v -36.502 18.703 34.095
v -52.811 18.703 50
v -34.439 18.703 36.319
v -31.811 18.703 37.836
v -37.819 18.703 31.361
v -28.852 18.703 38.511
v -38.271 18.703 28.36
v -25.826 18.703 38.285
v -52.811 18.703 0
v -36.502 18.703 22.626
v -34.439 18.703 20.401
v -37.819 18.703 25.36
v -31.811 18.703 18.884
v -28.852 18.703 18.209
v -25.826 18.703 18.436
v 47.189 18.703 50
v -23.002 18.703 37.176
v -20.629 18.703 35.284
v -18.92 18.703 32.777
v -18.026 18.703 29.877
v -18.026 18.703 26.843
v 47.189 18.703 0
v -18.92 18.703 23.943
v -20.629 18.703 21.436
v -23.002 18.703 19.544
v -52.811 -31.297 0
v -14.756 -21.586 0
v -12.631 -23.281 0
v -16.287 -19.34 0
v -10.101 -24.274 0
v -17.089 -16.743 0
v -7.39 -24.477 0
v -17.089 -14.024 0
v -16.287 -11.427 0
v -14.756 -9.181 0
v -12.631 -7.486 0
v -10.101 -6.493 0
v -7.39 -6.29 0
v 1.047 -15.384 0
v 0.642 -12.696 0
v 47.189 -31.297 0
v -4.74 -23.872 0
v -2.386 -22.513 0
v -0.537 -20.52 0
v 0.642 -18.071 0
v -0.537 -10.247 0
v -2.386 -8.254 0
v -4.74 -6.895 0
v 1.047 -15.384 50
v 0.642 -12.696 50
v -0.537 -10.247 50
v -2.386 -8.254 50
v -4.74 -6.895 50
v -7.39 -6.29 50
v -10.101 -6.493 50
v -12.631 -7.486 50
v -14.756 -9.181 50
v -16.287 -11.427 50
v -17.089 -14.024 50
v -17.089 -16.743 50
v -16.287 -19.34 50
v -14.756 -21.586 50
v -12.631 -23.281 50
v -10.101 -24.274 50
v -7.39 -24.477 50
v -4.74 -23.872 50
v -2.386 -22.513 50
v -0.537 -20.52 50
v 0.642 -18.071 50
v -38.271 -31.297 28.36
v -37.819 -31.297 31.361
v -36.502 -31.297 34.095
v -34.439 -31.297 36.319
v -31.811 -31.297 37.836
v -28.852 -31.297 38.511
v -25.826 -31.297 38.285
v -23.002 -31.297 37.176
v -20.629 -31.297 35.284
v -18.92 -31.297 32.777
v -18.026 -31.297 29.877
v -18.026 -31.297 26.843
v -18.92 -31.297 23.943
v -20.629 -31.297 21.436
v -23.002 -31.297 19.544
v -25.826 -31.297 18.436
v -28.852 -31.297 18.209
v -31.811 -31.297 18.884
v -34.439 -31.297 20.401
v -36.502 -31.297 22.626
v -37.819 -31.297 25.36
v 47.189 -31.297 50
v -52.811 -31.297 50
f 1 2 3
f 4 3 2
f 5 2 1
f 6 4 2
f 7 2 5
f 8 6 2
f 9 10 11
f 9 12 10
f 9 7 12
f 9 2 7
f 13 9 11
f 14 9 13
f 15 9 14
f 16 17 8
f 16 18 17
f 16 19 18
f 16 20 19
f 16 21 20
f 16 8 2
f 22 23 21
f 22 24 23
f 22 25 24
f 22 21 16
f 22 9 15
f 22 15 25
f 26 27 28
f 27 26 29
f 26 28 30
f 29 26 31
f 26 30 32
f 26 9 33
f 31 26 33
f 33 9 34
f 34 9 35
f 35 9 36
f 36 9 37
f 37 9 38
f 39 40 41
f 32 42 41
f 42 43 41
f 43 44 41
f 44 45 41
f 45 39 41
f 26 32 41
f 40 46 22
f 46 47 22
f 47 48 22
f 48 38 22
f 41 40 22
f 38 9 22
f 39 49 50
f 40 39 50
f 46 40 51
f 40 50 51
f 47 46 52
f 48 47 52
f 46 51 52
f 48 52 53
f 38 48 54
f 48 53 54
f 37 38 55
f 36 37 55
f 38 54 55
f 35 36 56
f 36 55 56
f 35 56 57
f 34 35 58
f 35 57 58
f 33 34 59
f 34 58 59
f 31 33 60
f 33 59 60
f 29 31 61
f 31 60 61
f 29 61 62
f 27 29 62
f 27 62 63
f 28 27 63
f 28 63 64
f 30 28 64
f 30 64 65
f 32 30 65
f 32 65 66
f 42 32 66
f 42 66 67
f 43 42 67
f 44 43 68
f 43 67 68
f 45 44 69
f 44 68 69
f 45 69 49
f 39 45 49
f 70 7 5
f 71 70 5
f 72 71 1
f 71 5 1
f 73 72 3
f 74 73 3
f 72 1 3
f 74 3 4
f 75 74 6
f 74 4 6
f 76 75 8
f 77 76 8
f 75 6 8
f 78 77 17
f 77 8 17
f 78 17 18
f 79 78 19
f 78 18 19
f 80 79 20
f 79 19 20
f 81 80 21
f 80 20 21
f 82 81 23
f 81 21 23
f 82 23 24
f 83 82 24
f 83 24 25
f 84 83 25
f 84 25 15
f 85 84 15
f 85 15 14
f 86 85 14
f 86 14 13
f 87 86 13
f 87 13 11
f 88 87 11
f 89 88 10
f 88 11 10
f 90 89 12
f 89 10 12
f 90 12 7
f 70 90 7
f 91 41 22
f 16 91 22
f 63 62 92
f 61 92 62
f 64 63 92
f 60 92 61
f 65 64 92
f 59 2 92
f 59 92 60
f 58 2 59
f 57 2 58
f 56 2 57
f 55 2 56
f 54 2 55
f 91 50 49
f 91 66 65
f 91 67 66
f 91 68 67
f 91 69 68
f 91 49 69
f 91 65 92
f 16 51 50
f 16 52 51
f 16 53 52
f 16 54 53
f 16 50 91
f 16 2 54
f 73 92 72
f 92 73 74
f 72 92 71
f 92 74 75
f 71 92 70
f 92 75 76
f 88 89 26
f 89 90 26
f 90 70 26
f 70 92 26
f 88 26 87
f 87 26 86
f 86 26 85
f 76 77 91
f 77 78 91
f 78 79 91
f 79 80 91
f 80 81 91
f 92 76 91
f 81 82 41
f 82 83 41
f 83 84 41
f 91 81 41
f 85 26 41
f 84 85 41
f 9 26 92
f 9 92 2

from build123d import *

# Parameters (mm, degrees)
F0_W     = 100
F0_H     = 50
F1_DEPTH = 50
F2_R     = 9.118909
F3_DEPTH = 50
F4_R     = 10.179687
F5_DEPTH = 50


with BuildPart() as f1:
    # F0 (on Top) → F1 (new body)
    with BuildSketch(Plane.XY):
        with Locations((-2.810752, -6.296756)):
            Rectangle(F0_W, F0_H)
    extrude(amount=F1_DEPTH)

    # F2 (on face) → F3 (cut, through all)
    with BuildSketch(Plane.XY.offset(50)):
        with Locations((-8.071532, -15.383557)):
            Circle(F2_R)
    extrude(amount=-F3_DEPTH, mode=Mode.SUBTRACT)

    # F4 (on face) → F5 (cut, through all)
    with BuildSketch(Plane(origin=(0, 18.703244, 0), x_dir=(-1, 0, 0), z_dir=(0, 1, 0))):
        with Locations((28.091645, 28.360171)):
            Circle(F4_R)
    extrude(amount=-F5_DEPTH, mode=Mode.SUBTRACT)


solid = f1.part
